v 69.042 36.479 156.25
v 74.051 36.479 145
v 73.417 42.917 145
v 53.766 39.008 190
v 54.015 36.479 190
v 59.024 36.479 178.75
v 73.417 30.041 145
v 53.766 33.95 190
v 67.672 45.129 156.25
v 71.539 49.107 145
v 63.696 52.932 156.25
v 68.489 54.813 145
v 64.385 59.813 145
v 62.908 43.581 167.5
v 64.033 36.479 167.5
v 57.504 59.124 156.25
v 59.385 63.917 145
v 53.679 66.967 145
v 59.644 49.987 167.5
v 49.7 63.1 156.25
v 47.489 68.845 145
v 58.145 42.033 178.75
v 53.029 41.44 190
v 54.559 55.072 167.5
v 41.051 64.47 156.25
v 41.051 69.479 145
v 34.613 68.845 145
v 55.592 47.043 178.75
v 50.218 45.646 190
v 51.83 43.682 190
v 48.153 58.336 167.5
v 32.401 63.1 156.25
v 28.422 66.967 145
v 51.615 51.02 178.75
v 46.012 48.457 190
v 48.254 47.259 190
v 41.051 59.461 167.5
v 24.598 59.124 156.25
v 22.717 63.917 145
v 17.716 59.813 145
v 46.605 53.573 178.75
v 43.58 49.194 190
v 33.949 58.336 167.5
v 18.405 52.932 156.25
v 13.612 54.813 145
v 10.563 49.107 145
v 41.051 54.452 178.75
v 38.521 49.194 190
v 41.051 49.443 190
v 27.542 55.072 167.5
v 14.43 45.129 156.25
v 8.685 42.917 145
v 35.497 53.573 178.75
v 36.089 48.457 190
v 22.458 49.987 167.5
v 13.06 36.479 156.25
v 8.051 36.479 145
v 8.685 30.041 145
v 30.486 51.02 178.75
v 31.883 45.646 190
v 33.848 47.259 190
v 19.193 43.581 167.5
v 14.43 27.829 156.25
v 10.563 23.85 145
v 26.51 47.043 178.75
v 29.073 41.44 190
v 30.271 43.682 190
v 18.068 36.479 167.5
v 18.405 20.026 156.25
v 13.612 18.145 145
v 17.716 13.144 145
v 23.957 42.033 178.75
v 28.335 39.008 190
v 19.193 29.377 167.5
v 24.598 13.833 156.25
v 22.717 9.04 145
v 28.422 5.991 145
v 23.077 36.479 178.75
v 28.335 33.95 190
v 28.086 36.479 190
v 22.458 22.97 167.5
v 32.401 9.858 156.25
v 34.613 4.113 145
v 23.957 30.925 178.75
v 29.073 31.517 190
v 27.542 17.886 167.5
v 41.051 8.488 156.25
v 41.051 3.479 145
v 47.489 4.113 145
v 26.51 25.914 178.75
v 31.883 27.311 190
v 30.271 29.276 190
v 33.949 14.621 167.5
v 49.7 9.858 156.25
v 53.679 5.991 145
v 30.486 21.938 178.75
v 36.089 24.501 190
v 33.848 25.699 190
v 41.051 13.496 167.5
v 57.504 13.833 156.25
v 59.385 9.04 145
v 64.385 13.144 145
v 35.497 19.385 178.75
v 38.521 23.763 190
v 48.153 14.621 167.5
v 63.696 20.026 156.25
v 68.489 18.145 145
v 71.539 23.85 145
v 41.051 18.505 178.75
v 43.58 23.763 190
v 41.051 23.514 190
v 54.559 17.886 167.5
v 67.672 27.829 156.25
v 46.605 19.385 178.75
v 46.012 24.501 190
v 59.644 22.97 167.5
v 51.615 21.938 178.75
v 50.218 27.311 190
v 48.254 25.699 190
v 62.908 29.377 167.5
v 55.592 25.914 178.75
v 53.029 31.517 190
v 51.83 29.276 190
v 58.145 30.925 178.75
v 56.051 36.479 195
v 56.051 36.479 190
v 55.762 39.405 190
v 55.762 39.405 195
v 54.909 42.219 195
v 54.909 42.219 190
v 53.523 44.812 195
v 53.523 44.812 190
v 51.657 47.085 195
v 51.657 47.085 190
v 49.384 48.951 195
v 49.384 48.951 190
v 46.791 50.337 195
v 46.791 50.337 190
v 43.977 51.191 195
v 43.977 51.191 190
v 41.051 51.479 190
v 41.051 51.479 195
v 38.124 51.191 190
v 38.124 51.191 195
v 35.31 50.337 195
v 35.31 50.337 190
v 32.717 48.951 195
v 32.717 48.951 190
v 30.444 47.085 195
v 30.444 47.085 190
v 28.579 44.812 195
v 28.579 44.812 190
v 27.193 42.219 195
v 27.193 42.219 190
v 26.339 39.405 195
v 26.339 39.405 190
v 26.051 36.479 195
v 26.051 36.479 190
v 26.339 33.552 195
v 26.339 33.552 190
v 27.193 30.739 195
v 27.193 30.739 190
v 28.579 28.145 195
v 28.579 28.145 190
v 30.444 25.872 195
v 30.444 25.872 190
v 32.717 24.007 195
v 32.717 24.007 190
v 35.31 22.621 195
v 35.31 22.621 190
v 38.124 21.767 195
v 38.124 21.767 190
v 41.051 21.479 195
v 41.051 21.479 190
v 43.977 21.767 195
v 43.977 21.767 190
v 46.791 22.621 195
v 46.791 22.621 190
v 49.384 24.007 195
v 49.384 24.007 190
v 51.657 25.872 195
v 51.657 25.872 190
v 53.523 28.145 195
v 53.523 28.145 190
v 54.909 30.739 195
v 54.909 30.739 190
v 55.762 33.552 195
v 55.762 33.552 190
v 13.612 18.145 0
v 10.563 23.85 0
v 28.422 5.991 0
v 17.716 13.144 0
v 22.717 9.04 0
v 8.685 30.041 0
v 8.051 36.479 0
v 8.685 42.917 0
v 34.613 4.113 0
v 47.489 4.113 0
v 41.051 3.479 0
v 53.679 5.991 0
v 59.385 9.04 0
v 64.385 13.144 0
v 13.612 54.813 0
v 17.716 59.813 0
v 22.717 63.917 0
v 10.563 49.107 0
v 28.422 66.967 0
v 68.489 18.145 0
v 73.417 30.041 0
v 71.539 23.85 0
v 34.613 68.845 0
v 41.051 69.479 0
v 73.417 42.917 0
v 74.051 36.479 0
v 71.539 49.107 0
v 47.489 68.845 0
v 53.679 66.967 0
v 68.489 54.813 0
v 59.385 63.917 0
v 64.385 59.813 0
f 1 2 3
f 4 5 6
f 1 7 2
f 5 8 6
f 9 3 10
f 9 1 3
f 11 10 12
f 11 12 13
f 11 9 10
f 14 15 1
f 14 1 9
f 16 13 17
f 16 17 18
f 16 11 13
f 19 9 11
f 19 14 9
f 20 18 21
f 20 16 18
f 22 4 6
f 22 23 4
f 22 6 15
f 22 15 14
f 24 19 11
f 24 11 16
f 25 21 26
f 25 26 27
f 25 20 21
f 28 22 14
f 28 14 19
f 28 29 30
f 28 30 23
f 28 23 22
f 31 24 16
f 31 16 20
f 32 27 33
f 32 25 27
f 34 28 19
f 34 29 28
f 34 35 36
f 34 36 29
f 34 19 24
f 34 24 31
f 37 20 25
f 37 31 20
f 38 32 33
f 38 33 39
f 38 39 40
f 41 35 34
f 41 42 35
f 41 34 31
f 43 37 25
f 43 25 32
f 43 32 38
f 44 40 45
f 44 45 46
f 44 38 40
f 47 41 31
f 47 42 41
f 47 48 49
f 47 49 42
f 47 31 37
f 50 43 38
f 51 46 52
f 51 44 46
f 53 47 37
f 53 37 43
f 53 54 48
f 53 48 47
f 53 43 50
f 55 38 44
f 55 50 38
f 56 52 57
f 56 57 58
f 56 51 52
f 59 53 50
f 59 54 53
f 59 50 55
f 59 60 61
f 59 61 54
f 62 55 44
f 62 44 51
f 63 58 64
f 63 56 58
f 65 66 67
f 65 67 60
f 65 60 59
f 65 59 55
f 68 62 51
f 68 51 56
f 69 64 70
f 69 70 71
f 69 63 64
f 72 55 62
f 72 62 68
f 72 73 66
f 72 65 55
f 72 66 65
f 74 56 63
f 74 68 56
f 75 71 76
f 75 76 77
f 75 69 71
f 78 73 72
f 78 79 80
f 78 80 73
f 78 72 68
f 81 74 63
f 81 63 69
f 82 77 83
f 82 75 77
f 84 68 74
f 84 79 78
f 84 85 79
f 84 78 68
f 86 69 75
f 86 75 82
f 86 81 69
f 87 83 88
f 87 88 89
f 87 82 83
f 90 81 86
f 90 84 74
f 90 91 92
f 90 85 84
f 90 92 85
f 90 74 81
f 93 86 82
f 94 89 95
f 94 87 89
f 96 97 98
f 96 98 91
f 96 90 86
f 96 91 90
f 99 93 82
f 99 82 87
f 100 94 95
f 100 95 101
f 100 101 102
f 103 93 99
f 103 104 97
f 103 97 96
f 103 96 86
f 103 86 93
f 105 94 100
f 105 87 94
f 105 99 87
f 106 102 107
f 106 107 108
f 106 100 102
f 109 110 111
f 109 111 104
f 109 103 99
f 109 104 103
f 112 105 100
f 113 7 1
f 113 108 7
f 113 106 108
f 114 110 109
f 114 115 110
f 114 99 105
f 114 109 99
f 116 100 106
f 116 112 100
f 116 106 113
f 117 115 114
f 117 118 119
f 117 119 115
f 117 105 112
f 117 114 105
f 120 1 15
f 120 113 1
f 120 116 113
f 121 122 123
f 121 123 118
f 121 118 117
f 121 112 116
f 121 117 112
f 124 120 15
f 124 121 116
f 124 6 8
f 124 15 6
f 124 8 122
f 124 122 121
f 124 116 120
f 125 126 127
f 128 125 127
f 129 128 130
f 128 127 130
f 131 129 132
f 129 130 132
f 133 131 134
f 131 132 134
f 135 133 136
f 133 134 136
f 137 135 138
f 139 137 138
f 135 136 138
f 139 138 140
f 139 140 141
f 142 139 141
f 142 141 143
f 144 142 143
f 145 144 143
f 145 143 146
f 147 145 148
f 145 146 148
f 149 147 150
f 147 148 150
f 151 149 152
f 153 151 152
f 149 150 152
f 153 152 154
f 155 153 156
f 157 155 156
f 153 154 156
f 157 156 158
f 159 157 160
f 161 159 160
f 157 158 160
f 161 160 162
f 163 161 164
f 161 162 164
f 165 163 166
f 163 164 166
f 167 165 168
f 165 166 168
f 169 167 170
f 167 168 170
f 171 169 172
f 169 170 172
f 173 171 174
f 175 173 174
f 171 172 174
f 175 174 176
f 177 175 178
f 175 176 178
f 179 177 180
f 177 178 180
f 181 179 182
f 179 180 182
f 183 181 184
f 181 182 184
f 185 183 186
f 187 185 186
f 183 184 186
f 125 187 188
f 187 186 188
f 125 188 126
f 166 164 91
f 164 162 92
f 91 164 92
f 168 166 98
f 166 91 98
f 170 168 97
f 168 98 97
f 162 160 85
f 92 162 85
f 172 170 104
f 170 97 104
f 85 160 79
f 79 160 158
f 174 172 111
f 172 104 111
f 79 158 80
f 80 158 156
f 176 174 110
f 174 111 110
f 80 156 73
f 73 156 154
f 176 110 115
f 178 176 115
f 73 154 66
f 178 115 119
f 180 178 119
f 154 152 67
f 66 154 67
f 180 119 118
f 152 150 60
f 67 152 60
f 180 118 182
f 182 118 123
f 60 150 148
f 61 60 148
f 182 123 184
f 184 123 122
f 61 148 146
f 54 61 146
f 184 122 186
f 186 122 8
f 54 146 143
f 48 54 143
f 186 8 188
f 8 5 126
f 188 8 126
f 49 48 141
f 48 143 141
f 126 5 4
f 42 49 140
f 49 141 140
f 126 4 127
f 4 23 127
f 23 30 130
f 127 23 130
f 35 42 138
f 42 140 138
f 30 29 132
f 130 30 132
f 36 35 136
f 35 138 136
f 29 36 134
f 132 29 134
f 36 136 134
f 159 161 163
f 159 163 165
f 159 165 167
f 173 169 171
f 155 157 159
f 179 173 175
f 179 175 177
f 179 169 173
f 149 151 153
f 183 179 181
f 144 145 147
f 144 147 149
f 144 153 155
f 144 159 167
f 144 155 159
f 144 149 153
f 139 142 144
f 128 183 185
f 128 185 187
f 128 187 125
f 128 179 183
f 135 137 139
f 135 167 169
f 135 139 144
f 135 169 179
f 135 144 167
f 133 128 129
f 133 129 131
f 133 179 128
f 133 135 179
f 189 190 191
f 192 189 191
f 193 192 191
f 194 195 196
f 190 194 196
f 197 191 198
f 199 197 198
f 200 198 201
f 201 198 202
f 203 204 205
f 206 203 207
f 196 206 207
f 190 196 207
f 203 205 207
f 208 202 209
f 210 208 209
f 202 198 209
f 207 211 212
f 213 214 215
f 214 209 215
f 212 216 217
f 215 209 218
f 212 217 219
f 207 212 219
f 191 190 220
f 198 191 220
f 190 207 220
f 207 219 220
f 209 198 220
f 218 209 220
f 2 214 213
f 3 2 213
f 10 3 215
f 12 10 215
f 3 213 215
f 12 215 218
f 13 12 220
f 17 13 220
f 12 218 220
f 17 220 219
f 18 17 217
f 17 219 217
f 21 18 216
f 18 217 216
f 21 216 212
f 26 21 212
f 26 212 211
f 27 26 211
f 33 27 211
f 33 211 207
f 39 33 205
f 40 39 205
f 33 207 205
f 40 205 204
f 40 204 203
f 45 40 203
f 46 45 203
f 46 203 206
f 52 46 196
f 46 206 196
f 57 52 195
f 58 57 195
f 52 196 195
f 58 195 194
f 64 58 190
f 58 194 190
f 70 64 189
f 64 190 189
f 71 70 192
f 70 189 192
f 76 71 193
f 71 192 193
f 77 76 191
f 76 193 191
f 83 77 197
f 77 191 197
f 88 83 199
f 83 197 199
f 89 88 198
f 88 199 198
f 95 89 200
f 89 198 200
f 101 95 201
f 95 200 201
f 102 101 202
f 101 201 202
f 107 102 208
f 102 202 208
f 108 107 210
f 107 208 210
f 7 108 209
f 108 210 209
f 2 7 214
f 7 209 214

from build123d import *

# Parameters (mm, degrees)
ESQUISSE2_R        = 33
BOSS_EXTRU_1_DEPTH = 145
ESQUISSE4_R        = 33
BOSS_EXTRU_2_DEPTH = 45
BOSS_EXTRU_2_TAPER = 24
ESQUISSE5_R        = 15
BOSS_EXTRU_3_DEPTH = 5


with BuildPart() as part:
    # Esquisse2 → Boss.-Extru.1 (new body)
    with BuildSketch(Plane.XY):
        with Locations((41.050709504, 36.47878936)):
            Circle(ESQUISSE2_R)
    extrude(amount=BOSS_EXTRU_1_DEPTH)

    # Esquisse4 → Boss.-Extru.2 (add)
    with BuildSketch(Plane.XY.offset(145)):
        with Locations((41.050709504, 36.47878936)):
            Circle(ESQUISSE4_R)
    extrude(amount=BOSS_EXTRU_2_DEPTH, taper=BOSS_EXTRU_2_TAPER)

    # Esquisse5 → Boss.-Extru.3 (add)
    with BuildSketch(Plane.XY.offset(190)):
        with Locations((41.050709504, 36.47878936)):
            Circle(ESQUISSE5_R)
    extrude(amount=BOSS_EXTRU_3_DEPTH)


solid = part.part
